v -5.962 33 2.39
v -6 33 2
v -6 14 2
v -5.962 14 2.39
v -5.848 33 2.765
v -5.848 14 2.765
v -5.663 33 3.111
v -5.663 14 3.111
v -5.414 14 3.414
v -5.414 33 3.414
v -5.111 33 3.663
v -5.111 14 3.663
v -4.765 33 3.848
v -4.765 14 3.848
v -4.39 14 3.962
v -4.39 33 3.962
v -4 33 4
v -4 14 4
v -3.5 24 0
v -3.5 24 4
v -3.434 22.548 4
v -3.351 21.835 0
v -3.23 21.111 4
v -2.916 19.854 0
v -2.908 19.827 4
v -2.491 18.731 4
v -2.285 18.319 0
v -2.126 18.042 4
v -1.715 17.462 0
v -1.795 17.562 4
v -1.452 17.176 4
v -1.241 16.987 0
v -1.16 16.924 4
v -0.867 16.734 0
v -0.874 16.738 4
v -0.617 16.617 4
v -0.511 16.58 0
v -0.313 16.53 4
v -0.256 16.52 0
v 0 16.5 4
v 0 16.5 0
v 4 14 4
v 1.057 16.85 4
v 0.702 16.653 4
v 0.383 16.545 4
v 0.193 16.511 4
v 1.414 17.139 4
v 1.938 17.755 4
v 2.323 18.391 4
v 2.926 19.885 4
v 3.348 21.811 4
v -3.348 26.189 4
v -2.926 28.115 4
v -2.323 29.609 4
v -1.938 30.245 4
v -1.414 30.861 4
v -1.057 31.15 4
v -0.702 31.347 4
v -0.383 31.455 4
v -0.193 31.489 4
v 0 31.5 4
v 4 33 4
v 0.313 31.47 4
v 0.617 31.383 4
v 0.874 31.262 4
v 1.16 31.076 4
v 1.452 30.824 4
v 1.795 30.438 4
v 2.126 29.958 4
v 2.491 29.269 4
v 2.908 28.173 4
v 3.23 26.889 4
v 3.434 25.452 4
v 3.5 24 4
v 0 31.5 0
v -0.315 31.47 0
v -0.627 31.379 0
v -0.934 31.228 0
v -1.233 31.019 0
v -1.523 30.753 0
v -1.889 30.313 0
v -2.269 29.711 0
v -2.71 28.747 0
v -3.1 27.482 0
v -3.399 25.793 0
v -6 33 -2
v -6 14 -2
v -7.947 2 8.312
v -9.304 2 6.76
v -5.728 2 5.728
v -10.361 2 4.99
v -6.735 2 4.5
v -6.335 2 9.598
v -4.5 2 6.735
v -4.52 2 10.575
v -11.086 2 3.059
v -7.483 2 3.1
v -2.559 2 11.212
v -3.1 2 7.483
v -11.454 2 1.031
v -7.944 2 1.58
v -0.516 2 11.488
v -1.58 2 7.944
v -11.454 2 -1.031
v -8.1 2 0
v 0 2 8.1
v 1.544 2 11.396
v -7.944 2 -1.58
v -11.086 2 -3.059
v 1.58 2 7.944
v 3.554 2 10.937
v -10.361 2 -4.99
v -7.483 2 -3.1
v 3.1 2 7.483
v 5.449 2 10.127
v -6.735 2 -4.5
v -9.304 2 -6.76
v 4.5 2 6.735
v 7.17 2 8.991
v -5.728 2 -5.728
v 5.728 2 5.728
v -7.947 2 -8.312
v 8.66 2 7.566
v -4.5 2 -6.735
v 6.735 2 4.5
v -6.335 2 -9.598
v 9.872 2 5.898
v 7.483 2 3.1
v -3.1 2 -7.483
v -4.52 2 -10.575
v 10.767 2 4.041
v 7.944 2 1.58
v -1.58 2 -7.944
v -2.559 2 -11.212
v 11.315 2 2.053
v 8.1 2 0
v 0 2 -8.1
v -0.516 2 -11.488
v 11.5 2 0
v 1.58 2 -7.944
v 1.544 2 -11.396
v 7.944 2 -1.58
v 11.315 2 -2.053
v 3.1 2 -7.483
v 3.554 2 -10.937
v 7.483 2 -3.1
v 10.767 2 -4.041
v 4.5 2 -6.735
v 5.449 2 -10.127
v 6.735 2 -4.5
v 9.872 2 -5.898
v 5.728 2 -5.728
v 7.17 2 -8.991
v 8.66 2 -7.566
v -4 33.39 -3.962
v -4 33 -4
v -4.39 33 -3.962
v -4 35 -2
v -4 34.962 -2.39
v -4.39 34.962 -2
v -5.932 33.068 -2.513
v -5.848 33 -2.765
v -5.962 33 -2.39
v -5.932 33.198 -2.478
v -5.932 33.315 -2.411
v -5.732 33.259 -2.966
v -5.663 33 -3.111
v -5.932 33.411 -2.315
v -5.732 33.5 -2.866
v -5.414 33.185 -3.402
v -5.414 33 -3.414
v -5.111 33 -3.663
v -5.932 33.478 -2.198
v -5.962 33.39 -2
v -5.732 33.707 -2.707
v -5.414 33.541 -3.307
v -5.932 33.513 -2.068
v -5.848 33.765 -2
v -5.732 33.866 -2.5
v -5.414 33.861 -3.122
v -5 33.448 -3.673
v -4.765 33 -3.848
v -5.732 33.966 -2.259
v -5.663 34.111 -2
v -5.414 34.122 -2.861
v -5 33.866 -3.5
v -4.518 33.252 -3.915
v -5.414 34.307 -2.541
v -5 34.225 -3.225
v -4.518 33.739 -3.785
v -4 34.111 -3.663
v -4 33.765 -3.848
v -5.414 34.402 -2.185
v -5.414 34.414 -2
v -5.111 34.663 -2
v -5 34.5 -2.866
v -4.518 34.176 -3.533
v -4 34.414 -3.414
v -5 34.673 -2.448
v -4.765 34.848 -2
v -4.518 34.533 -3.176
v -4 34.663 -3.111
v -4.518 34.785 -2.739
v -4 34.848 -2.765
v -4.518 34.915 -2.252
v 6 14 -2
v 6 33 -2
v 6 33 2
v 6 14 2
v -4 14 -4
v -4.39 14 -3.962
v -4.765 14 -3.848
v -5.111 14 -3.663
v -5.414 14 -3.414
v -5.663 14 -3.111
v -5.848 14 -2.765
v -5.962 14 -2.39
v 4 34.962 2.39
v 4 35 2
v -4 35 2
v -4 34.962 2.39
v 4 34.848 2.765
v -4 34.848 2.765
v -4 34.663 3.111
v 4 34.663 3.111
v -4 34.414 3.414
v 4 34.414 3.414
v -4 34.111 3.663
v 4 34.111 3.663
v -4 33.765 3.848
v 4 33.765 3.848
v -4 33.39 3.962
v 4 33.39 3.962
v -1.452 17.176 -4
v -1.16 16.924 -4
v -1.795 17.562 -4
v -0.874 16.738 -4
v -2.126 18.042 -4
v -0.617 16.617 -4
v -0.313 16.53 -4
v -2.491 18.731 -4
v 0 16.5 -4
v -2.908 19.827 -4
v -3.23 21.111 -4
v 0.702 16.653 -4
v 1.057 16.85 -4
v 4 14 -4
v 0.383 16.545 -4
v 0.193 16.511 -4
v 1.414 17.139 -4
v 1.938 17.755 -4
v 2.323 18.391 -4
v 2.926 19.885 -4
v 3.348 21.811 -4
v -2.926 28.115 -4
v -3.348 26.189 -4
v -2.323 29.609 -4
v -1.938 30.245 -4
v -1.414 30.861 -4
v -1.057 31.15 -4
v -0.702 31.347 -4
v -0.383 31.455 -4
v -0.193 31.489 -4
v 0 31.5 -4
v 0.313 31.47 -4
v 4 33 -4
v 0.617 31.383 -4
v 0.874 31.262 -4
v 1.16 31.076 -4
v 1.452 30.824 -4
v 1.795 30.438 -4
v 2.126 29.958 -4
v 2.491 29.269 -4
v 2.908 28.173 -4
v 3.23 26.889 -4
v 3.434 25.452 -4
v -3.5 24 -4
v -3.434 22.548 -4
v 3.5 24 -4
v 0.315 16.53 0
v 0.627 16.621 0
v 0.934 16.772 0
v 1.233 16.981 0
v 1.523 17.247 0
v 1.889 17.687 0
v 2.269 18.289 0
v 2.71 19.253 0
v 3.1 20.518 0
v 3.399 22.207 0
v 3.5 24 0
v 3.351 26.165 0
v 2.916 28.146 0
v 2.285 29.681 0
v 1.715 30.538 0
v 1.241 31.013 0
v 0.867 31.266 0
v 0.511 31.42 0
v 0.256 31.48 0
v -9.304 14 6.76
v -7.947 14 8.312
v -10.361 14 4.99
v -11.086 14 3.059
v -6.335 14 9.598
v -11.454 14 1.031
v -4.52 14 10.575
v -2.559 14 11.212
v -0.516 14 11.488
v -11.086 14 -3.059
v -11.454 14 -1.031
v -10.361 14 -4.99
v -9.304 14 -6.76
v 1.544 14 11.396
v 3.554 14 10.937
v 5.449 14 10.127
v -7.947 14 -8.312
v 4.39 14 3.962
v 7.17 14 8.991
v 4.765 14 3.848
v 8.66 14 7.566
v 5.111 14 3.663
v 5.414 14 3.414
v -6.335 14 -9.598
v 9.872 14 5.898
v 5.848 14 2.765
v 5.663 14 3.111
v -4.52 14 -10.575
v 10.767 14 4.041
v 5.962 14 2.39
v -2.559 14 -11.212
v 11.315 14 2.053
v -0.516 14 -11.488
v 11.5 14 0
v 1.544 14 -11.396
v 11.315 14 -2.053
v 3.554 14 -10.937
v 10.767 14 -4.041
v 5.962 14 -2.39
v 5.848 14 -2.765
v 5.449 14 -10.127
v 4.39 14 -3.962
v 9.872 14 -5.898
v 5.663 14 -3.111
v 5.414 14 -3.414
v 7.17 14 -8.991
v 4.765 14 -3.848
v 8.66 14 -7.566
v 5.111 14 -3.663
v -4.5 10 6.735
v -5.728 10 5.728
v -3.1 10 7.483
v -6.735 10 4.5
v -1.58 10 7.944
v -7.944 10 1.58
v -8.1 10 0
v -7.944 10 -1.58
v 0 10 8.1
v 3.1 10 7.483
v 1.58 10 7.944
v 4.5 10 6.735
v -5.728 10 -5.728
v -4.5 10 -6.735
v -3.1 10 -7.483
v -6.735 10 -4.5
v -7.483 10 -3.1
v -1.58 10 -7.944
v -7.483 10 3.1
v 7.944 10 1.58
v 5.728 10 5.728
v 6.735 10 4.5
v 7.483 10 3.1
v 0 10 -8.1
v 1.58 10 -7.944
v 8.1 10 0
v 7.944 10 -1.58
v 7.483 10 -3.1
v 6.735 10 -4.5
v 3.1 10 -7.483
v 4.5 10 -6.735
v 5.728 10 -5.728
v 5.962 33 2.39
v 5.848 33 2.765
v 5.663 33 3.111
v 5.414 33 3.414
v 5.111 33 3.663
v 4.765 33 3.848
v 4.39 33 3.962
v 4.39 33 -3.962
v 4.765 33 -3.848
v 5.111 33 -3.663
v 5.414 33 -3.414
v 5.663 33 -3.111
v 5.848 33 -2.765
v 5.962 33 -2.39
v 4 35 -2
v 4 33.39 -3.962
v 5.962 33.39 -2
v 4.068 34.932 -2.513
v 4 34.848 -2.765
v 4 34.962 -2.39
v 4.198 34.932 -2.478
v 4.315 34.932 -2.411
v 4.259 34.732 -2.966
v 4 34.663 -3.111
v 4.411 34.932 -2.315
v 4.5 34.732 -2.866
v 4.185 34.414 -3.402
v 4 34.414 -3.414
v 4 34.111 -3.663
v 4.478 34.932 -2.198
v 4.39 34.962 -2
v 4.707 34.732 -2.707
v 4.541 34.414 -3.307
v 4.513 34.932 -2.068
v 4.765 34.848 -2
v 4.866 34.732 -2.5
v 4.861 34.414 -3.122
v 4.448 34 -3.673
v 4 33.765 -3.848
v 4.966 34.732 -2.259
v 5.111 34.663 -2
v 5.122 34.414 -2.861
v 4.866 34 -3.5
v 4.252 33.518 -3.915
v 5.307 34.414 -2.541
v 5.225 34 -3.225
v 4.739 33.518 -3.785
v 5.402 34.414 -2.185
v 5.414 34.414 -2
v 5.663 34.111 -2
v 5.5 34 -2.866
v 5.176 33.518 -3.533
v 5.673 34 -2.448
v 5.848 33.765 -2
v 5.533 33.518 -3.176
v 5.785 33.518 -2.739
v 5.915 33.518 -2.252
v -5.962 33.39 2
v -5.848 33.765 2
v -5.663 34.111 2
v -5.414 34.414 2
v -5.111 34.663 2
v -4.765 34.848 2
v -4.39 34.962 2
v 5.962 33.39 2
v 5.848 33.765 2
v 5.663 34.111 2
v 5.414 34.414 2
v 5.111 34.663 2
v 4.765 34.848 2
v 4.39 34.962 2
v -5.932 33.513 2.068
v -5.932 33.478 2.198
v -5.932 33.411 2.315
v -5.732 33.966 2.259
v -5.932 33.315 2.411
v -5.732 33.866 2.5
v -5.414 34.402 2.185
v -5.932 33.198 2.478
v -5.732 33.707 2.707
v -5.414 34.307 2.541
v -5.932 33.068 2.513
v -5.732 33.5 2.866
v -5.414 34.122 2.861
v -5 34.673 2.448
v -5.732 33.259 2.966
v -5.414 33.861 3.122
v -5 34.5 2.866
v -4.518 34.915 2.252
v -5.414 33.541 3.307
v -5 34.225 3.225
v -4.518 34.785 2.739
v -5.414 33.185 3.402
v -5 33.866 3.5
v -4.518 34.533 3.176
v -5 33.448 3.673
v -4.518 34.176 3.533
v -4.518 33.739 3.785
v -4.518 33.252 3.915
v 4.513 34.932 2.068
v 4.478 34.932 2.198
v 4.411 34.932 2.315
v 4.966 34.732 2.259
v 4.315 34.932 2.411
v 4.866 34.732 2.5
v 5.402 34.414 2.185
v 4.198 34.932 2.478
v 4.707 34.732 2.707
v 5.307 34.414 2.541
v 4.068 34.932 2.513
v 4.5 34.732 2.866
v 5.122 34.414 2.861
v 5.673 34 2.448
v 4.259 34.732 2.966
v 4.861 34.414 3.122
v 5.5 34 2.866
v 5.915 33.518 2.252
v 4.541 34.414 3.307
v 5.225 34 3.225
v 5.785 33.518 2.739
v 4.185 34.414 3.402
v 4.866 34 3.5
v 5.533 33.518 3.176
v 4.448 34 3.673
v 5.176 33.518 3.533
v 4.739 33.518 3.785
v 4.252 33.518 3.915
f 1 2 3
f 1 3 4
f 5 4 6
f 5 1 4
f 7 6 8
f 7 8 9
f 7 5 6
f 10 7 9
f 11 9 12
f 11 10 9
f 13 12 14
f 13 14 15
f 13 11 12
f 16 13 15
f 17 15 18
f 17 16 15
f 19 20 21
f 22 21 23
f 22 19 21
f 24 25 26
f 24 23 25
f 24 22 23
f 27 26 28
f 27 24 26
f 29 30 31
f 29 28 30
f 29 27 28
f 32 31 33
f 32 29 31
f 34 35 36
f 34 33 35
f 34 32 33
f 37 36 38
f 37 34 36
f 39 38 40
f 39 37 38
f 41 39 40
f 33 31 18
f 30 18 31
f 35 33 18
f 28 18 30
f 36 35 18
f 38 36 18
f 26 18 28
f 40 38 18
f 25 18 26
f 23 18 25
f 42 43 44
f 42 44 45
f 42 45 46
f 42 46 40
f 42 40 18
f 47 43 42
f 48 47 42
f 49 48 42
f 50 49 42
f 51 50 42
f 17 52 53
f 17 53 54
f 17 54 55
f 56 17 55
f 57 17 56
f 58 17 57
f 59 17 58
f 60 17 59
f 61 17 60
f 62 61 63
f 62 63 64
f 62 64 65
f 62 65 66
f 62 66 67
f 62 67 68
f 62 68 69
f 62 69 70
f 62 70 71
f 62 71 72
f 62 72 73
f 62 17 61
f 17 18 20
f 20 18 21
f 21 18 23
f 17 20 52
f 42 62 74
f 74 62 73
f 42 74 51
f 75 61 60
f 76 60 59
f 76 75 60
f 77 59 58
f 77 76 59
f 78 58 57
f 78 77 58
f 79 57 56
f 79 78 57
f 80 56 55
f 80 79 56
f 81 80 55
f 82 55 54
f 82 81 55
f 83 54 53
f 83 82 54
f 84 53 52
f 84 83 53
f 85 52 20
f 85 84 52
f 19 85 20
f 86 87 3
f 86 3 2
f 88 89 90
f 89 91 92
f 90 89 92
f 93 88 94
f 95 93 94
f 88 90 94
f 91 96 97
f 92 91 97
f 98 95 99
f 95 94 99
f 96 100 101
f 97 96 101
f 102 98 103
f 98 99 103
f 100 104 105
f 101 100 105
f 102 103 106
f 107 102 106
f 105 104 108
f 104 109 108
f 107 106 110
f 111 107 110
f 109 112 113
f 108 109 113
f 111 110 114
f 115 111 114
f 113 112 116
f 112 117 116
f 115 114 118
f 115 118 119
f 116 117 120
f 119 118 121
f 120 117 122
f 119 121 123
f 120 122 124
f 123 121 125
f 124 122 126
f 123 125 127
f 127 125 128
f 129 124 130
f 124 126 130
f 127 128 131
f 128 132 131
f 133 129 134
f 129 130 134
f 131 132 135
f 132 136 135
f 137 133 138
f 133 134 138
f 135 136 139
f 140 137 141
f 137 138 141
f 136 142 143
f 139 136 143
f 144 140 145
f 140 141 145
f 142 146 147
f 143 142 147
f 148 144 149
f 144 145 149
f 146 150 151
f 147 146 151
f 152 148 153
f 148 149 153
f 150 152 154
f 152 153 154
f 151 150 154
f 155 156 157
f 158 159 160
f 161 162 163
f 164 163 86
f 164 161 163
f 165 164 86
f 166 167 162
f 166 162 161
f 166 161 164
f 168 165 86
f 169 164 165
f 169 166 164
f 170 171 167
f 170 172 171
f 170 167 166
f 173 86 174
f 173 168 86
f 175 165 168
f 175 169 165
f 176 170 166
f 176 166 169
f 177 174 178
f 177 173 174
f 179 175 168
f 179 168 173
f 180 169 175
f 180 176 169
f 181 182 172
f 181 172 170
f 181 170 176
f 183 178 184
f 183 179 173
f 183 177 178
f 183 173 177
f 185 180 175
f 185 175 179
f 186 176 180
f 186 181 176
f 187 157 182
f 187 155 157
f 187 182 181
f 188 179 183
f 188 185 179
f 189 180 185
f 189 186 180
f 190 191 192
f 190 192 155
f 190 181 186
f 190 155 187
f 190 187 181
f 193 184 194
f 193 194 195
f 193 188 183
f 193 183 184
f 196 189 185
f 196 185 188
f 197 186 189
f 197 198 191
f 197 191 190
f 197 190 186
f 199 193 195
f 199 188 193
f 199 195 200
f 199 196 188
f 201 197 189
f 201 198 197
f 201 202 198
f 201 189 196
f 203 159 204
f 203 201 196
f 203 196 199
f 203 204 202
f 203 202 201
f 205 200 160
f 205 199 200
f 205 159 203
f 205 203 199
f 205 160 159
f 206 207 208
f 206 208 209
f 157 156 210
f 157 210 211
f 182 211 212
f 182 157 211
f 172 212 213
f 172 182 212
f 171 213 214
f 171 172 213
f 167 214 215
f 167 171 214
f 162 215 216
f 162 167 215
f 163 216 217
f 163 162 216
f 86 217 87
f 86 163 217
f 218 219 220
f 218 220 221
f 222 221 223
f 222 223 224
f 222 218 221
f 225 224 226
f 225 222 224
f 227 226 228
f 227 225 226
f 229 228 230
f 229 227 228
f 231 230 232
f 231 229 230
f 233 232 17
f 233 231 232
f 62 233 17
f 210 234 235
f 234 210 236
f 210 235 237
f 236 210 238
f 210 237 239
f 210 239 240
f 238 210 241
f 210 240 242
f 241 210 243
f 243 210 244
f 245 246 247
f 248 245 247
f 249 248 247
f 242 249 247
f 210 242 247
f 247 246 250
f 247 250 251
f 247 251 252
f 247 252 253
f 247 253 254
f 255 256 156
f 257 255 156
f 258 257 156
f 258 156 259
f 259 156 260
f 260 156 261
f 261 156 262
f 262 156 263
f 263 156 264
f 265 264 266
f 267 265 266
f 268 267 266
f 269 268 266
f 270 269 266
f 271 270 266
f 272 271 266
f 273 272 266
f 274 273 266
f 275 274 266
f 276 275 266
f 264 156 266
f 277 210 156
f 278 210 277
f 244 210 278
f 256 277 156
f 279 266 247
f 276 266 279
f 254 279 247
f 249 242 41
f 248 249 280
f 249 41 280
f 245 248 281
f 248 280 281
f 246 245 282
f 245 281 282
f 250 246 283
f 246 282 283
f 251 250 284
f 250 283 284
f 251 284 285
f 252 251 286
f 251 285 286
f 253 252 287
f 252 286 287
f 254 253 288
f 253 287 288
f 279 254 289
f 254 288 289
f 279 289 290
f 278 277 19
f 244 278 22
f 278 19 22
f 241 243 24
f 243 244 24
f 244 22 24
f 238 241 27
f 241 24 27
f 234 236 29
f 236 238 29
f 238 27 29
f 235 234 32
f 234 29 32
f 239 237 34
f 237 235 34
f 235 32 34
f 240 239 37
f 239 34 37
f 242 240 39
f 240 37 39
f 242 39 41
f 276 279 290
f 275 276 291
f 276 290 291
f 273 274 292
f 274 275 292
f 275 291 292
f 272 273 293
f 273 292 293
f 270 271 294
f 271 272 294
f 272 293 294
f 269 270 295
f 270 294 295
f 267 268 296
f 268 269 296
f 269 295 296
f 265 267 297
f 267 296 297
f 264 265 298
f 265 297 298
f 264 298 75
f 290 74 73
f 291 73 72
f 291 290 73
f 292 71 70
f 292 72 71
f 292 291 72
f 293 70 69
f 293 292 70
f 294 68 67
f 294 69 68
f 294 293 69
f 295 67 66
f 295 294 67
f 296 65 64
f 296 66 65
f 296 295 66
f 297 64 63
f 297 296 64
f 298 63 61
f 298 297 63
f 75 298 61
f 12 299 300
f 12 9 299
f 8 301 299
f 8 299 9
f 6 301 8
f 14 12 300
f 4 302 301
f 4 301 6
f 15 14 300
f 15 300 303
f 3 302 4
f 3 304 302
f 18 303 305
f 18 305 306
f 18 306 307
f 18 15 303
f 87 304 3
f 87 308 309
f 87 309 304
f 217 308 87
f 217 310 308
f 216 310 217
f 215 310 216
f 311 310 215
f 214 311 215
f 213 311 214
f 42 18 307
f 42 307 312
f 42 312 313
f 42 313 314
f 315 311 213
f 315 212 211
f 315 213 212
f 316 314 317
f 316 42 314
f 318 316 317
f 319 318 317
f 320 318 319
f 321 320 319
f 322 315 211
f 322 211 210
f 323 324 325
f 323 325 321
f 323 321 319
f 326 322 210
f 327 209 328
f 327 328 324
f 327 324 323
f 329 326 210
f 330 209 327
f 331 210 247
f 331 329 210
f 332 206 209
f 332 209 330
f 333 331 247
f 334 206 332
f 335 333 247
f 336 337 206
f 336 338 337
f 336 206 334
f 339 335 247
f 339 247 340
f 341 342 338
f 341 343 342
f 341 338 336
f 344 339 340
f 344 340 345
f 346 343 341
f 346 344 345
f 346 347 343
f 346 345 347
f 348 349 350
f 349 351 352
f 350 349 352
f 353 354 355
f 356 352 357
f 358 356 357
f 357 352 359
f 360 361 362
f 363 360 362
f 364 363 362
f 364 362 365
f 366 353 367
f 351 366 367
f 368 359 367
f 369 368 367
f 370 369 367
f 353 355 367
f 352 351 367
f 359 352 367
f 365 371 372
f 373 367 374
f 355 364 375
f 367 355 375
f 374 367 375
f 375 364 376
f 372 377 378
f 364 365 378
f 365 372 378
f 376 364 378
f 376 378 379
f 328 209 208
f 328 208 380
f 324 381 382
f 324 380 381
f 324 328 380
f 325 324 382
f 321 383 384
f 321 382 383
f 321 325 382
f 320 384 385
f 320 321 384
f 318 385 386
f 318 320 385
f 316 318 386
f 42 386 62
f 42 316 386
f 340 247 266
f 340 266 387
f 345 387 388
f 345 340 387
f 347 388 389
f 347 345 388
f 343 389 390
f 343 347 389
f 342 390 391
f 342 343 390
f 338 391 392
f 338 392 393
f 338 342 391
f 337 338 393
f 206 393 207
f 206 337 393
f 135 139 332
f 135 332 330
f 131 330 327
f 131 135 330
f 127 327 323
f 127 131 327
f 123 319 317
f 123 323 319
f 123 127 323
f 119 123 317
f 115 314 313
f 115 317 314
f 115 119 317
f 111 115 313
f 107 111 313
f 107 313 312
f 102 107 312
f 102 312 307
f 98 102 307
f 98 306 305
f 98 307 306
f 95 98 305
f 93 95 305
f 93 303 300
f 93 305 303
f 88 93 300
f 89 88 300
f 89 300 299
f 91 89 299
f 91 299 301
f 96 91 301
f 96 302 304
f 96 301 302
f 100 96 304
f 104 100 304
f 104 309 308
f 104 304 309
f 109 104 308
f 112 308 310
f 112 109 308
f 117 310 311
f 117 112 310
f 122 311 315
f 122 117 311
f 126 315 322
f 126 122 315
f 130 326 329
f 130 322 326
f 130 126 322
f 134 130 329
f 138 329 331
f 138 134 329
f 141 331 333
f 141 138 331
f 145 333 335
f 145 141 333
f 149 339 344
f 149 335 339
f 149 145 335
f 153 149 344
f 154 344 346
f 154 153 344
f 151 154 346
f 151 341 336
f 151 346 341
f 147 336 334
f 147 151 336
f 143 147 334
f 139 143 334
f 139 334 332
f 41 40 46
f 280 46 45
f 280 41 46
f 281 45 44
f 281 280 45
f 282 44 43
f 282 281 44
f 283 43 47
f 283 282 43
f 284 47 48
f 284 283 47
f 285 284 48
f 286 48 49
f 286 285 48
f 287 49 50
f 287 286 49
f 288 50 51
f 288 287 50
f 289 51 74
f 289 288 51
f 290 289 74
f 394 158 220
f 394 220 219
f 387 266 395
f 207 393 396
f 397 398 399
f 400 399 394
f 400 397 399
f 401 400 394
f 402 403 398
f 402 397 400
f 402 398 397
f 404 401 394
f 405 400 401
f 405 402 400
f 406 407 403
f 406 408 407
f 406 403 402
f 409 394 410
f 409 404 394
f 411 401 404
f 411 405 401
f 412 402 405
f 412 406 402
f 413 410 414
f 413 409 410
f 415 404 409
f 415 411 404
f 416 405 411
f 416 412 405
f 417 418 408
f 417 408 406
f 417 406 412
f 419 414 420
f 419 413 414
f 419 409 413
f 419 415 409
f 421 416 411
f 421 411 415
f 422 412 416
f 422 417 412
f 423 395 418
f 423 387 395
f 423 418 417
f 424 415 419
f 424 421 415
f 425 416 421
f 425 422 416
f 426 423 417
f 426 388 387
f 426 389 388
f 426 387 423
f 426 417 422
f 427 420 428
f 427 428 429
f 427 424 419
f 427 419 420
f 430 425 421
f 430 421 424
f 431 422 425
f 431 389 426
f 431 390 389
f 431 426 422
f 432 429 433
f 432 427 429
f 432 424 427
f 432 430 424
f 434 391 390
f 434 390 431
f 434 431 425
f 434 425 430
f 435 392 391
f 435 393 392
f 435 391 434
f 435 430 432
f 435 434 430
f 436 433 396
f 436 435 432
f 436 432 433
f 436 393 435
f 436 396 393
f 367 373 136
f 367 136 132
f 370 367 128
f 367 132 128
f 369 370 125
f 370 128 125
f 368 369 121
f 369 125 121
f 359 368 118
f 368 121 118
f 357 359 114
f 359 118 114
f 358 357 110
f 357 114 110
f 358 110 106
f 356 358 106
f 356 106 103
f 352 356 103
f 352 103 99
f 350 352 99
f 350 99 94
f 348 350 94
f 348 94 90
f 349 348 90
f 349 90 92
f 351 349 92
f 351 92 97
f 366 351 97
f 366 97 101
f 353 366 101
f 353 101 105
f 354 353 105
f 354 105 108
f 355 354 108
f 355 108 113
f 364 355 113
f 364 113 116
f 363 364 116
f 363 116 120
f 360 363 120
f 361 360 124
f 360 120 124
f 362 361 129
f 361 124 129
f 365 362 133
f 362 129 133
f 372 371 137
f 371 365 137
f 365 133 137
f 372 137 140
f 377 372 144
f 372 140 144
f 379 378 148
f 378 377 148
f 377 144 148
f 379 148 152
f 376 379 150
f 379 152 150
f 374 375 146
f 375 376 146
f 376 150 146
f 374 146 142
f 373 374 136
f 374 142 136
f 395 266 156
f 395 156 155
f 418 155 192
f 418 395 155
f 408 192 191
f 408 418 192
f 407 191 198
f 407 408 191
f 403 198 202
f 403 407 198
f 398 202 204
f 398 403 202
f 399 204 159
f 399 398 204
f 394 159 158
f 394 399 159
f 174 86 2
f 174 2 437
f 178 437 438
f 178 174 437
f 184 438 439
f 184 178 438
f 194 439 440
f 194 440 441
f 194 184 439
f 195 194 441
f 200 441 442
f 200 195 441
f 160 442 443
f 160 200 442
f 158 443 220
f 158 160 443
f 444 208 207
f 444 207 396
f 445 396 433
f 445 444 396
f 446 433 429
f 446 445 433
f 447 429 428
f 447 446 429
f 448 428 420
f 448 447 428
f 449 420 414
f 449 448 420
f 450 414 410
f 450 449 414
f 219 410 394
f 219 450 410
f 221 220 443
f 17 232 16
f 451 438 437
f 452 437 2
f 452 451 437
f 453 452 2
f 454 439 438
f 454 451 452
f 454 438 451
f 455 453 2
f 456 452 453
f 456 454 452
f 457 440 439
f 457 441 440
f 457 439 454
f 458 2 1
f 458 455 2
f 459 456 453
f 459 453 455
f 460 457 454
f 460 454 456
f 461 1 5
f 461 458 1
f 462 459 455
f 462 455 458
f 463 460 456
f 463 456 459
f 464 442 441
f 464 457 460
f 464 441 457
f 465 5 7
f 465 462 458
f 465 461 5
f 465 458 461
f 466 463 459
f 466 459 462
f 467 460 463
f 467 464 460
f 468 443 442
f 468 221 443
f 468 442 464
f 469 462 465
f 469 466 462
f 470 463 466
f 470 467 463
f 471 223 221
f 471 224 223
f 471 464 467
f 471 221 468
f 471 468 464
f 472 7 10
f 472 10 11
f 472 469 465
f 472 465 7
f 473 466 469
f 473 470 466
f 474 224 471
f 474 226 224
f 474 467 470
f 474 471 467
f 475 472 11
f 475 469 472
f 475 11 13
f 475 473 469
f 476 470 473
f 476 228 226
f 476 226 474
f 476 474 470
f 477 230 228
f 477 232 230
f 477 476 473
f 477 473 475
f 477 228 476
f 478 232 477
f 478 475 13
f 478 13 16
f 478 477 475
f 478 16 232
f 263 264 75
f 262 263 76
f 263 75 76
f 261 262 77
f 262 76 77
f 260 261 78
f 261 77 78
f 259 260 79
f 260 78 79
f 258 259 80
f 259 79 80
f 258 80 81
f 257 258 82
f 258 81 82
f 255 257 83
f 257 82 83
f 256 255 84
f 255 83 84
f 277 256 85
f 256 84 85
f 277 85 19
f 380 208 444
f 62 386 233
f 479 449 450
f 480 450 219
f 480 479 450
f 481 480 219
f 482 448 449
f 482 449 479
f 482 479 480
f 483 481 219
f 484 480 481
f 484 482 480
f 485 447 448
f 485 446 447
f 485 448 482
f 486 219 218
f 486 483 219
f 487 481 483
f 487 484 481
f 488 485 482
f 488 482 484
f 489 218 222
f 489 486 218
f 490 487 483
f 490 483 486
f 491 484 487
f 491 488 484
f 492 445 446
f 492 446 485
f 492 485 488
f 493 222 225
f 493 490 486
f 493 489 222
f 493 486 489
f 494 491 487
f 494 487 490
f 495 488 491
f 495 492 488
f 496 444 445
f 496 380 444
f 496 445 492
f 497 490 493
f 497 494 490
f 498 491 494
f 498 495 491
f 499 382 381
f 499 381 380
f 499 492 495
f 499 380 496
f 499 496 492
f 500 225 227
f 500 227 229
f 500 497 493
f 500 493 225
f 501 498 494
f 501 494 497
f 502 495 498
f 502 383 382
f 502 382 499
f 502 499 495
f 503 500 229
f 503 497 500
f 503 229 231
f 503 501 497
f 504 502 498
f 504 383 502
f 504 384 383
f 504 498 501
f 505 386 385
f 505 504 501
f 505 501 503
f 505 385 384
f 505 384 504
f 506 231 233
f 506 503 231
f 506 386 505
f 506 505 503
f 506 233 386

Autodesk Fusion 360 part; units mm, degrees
sketch "Sketch1" plane through (0, 0, 0) normal (0, 1, 0) x (1, 0, 0)
  circle A0 centre (0, 0) radius 8.1
  circle A1 centre (0, 0) radius 11.5
  dimension "d1" = 16.2
  dimension "d2" = 23
extrude "Extrude1" add sketch "Sketch1" along normal blind 8 from surface at 2
extrude "Extrude2" add sketch "Sketch1" along normal blind 4 from surface at 10 contours A0 | A1
sketch "Sketch2" plane through (0, 0, 0) normal (0, 0, 1) x (1, 0, 0)
  ellipse E0 centre (0, 24) end of major axis (0, 31.5) minor radius 3.5
  line L0 (0, 16.5) -> (0, 31.5)
  line L1 (3.5, 24) -> (-3.5, 24)
  dimension "d8" = 15
  dimension "d9" = 7
  dimension "d10" = 24
sketch "Sketch3" plane through (0, 0, 0) normal (0, 0, 1) x (1, 0, 0)
  line L0 (6, 12) -> (-6, 12)
  line L1 (-6, 12) -> (-6, 35)
  line L2 (-6, 35) -> (6, 35)
  line L3 (6, 35) -> (6, 12)
  line L4 (6, 12) -> (-6, 35) construction
  line L5 (-6, 12) -> (6, 35) construction
  point P0 (0, 23.5)
  dimension "d11" = 12
  dimension "d12" = 23
  dimension "d13" = 12
extrude "Extrude3" add sketch "Sketch3" along normal mid plane 8
extrude "Extrude4" cut sketch "Sketch2" along normal mid plane 20
fillet "Fillet1" radius 2 8 edges at (6, 24.5, 4) (6, 24.5, -4) (0, 35, 4) (0, 35, -4) (6, 35, 0) (-6, 35, 0) (-6, 24.5, 4) (-6, 24.5, -4)
ref_plane "WorkPlane1" through (0, 10, 0) normal (0, -1, 0) x (-1, 0, 0)
